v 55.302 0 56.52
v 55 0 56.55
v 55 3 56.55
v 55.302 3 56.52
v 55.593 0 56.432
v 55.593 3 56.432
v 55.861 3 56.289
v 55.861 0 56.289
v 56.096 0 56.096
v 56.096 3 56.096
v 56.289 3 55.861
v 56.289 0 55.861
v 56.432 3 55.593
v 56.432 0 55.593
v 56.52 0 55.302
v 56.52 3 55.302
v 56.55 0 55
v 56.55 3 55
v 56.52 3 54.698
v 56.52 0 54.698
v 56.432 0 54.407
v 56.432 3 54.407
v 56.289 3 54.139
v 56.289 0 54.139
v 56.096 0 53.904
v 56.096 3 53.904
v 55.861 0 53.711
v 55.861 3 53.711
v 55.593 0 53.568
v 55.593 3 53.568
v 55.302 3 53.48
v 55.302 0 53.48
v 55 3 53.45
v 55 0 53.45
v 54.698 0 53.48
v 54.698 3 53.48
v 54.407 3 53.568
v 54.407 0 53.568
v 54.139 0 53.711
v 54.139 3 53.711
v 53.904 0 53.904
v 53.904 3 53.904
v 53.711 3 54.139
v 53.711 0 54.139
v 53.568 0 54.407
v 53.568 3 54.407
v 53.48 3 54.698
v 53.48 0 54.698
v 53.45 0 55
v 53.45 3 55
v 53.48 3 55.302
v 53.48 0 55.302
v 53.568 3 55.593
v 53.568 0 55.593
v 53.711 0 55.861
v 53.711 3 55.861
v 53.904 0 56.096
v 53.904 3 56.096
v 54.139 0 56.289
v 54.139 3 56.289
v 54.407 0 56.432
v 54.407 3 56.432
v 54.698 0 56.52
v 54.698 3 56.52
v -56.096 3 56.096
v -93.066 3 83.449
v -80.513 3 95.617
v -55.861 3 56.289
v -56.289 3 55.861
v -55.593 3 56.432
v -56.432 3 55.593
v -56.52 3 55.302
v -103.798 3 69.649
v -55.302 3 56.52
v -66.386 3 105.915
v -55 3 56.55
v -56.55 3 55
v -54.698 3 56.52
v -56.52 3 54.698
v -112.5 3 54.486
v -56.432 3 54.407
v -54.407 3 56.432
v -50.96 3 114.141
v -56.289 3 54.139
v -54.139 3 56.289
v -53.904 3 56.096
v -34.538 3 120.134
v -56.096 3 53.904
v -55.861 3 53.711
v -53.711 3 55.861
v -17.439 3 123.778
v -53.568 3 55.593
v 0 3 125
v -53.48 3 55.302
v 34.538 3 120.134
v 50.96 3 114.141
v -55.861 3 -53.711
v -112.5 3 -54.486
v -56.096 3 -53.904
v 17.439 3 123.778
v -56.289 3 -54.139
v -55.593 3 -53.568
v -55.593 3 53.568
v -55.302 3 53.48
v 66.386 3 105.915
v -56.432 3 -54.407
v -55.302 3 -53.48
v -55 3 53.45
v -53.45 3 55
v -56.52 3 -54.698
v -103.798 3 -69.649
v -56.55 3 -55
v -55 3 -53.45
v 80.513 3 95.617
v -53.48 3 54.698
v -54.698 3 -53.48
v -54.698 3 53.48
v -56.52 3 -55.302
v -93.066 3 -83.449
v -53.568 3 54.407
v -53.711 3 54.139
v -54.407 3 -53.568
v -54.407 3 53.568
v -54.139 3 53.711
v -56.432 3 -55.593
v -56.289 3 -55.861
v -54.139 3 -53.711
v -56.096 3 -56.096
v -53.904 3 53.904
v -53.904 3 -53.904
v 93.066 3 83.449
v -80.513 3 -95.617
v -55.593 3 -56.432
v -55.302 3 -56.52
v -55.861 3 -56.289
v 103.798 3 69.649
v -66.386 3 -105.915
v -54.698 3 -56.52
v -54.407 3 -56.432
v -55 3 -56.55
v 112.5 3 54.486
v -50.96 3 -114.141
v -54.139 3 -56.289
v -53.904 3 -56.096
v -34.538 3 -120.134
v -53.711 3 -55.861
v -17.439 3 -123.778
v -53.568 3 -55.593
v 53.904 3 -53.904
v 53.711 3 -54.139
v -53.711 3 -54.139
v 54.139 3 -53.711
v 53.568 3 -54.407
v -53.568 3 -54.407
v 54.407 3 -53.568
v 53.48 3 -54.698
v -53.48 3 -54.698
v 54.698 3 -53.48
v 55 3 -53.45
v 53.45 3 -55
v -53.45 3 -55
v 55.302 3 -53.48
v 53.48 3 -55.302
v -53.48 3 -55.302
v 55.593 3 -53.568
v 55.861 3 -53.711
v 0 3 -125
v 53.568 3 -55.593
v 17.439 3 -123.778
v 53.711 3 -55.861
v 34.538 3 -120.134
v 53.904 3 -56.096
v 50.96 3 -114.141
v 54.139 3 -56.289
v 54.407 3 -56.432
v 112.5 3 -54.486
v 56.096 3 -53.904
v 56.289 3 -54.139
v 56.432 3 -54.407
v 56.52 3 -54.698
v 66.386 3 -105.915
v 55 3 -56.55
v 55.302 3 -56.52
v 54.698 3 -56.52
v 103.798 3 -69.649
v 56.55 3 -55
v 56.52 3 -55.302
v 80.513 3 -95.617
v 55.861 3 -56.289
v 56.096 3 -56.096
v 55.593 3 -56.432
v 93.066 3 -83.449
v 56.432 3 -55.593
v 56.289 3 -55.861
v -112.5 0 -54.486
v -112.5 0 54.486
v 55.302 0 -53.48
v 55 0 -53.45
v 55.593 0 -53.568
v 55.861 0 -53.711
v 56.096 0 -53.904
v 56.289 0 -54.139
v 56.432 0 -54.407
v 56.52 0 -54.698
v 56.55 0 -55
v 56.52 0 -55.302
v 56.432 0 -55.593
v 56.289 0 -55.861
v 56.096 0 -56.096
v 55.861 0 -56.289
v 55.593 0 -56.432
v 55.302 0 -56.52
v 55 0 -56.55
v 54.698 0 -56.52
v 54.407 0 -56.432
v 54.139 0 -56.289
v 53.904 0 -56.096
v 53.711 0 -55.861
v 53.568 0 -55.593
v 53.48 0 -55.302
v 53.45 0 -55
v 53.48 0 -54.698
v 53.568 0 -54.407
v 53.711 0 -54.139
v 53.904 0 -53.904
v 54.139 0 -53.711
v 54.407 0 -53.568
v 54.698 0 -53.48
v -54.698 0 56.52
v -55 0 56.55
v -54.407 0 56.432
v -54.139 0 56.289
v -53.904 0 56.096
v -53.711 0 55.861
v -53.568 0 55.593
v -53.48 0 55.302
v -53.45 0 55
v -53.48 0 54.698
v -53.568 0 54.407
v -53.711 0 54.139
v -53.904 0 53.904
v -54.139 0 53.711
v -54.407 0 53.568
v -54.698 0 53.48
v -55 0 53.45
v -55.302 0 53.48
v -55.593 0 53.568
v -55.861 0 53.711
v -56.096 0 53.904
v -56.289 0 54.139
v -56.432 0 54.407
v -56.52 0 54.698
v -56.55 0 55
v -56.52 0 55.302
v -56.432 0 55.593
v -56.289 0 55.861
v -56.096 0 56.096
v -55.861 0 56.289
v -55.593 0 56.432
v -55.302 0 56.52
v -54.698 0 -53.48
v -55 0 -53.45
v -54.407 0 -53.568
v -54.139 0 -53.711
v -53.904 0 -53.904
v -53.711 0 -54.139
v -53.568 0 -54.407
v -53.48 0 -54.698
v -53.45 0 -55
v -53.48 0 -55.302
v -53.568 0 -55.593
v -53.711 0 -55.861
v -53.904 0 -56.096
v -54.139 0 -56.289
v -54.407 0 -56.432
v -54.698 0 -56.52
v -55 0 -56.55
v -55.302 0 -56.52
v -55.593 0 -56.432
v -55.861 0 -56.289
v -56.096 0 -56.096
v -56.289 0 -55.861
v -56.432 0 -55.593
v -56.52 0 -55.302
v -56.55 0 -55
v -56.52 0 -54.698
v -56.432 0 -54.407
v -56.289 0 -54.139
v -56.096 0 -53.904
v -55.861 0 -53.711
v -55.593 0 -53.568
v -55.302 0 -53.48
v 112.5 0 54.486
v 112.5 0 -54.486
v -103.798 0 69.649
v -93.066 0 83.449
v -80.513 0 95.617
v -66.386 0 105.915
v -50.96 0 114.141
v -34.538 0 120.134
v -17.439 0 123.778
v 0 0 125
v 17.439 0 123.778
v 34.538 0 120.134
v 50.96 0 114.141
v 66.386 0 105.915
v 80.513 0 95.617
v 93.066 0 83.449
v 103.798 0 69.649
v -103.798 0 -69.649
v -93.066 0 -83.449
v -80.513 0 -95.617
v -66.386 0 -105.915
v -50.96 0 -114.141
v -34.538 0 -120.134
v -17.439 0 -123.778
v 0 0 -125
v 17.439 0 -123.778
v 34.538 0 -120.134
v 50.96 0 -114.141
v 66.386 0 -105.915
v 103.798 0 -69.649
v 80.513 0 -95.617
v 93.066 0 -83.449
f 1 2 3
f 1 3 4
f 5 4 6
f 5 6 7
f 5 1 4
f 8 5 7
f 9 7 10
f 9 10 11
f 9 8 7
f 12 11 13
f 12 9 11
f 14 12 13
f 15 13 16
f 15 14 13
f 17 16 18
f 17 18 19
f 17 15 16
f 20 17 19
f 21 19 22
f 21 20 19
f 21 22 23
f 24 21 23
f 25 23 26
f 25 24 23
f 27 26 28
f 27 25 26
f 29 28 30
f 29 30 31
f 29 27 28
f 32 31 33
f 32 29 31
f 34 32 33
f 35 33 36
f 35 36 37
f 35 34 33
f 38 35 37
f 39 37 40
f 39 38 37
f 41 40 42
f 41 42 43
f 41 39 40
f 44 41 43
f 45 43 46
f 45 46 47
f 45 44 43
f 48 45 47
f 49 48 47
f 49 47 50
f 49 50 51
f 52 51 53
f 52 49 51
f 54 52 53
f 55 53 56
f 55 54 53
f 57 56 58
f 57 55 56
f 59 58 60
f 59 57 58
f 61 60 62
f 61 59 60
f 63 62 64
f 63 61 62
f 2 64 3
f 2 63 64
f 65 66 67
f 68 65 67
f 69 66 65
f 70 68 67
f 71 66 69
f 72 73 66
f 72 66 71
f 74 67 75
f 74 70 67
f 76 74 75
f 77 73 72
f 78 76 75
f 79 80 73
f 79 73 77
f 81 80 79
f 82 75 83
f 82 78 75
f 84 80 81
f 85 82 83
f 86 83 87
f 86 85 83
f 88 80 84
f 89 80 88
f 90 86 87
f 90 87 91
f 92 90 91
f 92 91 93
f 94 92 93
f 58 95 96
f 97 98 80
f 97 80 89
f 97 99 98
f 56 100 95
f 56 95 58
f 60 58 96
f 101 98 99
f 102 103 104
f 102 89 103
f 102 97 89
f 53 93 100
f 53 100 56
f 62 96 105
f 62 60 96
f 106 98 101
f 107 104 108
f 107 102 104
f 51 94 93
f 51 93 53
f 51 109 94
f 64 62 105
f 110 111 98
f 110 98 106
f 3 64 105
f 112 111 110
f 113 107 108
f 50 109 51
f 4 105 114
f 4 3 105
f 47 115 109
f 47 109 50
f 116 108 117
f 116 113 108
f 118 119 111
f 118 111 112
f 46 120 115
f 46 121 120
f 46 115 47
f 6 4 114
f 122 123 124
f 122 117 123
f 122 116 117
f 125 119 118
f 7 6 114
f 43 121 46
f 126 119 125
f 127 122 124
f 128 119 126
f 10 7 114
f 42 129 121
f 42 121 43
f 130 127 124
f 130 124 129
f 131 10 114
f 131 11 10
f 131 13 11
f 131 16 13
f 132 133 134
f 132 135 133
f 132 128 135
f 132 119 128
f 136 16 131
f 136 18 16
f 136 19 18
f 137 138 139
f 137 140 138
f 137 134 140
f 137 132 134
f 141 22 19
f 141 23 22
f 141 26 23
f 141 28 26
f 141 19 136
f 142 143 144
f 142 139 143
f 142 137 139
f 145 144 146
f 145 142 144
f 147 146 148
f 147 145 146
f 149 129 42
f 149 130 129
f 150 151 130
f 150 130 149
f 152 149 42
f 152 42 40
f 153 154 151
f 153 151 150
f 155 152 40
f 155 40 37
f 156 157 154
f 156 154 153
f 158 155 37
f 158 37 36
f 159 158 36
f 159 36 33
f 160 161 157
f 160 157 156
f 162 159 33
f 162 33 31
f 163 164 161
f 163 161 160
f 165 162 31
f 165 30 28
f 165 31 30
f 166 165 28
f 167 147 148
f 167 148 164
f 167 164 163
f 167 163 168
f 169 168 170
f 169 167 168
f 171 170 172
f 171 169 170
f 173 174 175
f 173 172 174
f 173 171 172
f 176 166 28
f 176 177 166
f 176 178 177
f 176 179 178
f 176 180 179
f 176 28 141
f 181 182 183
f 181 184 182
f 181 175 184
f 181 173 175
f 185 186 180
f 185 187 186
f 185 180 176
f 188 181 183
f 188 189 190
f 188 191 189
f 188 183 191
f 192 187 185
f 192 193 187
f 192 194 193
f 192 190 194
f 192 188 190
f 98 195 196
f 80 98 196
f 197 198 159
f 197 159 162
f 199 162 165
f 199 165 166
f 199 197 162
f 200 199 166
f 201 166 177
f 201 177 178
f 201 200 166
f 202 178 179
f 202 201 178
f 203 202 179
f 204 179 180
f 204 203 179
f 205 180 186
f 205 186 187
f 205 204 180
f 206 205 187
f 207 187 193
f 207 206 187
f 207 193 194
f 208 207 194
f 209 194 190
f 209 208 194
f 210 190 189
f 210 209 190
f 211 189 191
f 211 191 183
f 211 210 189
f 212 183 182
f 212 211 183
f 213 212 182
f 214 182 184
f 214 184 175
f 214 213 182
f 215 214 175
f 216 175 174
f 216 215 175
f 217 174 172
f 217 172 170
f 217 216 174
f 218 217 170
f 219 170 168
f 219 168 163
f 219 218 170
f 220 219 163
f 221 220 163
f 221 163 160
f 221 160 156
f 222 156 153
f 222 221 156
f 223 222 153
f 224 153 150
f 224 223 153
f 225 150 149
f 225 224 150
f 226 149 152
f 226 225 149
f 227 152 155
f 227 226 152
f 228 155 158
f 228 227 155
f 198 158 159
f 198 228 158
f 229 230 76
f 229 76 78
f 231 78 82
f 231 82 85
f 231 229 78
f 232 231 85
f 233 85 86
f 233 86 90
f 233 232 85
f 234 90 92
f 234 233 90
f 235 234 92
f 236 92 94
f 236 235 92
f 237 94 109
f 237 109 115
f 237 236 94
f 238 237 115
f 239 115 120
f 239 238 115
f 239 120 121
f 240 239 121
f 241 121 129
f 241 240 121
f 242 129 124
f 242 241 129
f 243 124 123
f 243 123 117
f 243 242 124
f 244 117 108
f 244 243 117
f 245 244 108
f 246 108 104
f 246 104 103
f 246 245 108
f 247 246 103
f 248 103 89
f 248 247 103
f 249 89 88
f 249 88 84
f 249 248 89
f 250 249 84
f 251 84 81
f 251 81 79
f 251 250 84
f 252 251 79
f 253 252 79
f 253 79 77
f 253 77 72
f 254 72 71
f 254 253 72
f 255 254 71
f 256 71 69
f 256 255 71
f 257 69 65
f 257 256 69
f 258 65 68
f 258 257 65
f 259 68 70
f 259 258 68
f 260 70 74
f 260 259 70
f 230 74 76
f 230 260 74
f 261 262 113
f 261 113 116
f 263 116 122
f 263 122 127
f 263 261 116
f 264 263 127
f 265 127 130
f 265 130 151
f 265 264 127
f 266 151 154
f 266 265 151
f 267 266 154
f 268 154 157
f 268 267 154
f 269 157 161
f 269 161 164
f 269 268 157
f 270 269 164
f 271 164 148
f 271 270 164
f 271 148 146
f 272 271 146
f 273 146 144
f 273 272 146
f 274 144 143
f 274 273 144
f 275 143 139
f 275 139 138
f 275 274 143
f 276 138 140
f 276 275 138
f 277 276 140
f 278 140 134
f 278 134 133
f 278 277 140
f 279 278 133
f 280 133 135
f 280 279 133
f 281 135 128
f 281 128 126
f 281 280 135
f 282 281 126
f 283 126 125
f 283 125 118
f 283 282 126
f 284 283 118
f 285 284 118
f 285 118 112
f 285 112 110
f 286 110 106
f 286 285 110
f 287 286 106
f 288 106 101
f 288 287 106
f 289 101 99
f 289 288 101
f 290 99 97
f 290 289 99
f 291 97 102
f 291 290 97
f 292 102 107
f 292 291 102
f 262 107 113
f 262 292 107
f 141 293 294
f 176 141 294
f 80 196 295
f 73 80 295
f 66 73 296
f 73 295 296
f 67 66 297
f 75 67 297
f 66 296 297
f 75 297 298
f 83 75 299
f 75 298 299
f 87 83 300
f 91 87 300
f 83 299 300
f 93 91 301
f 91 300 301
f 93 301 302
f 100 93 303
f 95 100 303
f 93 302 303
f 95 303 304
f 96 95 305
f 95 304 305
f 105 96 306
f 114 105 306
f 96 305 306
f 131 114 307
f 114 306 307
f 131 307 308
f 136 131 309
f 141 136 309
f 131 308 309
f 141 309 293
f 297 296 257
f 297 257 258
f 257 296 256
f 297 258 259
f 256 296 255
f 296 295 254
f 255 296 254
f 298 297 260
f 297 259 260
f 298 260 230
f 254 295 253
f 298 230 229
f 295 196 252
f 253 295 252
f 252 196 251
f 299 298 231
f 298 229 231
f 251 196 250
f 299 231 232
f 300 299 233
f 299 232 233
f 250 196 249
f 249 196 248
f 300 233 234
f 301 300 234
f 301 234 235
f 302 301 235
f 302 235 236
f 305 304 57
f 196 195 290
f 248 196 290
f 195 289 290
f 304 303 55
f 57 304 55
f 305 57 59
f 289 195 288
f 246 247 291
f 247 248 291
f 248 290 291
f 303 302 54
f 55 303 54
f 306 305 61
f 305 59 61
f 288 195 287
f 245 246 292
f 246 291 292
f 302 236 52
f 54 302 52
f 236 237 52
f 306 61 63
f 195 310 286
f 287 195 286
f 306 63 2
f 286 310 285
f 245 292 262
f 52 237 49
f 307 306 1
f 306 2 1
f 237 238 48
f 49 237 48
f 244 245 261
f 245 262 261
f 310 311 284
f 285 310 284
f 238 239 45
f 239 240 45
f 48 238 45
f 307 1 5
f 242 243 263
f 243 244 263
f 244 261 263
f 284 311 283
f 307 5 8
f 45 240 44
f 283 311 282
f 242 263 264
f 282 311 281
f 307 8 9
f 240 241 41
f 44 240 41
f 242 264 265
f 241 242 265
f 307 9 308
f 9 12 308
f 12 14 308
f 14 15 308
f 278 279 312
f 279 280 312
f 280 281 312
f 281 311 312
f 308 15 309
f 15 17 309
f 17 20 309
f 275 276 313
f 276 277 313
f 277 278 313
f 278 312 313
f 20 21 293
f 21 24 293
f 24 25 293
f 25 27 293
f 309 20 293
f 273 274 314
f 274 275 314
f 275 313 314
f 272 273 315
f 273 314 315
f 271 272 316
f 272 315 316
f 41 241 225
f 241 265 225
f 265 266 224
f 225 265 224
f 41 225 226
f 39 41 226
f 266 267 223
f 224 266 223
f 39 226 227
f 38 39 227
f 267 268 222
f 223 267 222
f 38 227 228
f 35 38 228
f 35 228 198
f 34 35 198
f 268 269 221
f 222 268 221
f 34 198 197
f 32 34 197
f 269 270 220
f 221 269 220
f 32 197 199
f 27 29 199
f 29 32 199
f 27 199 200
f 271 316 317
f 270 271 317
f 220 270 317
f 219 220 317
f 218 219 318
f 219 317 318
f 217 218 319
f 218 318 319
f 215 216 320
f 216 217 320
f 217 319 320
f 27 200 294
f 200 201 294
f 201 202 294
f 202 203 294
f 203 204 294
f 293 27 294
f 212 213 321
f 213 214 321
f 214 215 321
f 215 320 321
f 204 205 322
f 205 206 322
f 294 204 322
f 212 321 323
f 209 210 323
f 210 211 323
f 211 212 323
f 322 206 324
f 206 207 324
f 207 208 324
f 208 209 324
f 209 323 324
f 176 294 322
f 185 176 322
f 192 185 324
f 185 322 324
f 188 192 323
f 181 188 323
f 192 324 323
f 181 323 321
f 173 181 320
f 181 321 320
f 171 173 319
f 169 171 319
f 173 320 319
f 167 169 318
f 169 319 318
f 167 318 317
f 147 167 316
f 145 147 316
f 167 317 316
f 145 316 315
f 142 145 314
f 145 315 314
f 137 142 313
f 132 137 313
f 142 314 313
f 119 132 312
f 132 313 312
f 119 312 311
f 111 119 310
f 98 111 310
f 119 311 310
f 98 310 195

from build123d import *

# Parameters (mm, degrees)
SKETCH1_R           = 1.55
BOSS_EXTRUDE1_DEPTH = 3


with BuildPart() as part:
    # Sketch1 → Boss-Extrude1 (new body)
    with BuildSketch(Plane(origin=(0, 0, 0), x_dir=(1, 0, 0), z_dir=(0, 1, 0))):
        with BuildLine():
            ThreePointArc((112.5, 54.486236794), (0, 125), (-112.5, 54.486236794))
            Line((-112.5, 54.486236794), (-112.5, -54.486236794))
            ThreePointArc((-112.5, -54.486236794), (0, -125), (112.5, -54.486236794))
            Line((112.5, -54.486236794), (112.5, 54.486236794))
        make_face()
        with Locations(Location((-55, -55, 0), (0, 0, 270))):
            Circle(SKETCH1_R, mode=Mode.SUBTRACT)
        with Locations(Location((55, -55, 0), (0, 0, 270))):
            Circle(SKETCH1_R, mode=Mode.SUBTRACT)
        with Locations(Location((-55, 55, 0), (0, 0, 270))):
            Circle(SKETCH1_R, mode=Mode.SUBTRACT)
        with Locations(Location((55, 55, 0), (0, 0, 270))):
            Circle(SKETCH1_R, mode=Mode.SUBTRACT)
    extrude(amount=BOSS_EXTRUDE1_DEPTH)


solid = part.part
